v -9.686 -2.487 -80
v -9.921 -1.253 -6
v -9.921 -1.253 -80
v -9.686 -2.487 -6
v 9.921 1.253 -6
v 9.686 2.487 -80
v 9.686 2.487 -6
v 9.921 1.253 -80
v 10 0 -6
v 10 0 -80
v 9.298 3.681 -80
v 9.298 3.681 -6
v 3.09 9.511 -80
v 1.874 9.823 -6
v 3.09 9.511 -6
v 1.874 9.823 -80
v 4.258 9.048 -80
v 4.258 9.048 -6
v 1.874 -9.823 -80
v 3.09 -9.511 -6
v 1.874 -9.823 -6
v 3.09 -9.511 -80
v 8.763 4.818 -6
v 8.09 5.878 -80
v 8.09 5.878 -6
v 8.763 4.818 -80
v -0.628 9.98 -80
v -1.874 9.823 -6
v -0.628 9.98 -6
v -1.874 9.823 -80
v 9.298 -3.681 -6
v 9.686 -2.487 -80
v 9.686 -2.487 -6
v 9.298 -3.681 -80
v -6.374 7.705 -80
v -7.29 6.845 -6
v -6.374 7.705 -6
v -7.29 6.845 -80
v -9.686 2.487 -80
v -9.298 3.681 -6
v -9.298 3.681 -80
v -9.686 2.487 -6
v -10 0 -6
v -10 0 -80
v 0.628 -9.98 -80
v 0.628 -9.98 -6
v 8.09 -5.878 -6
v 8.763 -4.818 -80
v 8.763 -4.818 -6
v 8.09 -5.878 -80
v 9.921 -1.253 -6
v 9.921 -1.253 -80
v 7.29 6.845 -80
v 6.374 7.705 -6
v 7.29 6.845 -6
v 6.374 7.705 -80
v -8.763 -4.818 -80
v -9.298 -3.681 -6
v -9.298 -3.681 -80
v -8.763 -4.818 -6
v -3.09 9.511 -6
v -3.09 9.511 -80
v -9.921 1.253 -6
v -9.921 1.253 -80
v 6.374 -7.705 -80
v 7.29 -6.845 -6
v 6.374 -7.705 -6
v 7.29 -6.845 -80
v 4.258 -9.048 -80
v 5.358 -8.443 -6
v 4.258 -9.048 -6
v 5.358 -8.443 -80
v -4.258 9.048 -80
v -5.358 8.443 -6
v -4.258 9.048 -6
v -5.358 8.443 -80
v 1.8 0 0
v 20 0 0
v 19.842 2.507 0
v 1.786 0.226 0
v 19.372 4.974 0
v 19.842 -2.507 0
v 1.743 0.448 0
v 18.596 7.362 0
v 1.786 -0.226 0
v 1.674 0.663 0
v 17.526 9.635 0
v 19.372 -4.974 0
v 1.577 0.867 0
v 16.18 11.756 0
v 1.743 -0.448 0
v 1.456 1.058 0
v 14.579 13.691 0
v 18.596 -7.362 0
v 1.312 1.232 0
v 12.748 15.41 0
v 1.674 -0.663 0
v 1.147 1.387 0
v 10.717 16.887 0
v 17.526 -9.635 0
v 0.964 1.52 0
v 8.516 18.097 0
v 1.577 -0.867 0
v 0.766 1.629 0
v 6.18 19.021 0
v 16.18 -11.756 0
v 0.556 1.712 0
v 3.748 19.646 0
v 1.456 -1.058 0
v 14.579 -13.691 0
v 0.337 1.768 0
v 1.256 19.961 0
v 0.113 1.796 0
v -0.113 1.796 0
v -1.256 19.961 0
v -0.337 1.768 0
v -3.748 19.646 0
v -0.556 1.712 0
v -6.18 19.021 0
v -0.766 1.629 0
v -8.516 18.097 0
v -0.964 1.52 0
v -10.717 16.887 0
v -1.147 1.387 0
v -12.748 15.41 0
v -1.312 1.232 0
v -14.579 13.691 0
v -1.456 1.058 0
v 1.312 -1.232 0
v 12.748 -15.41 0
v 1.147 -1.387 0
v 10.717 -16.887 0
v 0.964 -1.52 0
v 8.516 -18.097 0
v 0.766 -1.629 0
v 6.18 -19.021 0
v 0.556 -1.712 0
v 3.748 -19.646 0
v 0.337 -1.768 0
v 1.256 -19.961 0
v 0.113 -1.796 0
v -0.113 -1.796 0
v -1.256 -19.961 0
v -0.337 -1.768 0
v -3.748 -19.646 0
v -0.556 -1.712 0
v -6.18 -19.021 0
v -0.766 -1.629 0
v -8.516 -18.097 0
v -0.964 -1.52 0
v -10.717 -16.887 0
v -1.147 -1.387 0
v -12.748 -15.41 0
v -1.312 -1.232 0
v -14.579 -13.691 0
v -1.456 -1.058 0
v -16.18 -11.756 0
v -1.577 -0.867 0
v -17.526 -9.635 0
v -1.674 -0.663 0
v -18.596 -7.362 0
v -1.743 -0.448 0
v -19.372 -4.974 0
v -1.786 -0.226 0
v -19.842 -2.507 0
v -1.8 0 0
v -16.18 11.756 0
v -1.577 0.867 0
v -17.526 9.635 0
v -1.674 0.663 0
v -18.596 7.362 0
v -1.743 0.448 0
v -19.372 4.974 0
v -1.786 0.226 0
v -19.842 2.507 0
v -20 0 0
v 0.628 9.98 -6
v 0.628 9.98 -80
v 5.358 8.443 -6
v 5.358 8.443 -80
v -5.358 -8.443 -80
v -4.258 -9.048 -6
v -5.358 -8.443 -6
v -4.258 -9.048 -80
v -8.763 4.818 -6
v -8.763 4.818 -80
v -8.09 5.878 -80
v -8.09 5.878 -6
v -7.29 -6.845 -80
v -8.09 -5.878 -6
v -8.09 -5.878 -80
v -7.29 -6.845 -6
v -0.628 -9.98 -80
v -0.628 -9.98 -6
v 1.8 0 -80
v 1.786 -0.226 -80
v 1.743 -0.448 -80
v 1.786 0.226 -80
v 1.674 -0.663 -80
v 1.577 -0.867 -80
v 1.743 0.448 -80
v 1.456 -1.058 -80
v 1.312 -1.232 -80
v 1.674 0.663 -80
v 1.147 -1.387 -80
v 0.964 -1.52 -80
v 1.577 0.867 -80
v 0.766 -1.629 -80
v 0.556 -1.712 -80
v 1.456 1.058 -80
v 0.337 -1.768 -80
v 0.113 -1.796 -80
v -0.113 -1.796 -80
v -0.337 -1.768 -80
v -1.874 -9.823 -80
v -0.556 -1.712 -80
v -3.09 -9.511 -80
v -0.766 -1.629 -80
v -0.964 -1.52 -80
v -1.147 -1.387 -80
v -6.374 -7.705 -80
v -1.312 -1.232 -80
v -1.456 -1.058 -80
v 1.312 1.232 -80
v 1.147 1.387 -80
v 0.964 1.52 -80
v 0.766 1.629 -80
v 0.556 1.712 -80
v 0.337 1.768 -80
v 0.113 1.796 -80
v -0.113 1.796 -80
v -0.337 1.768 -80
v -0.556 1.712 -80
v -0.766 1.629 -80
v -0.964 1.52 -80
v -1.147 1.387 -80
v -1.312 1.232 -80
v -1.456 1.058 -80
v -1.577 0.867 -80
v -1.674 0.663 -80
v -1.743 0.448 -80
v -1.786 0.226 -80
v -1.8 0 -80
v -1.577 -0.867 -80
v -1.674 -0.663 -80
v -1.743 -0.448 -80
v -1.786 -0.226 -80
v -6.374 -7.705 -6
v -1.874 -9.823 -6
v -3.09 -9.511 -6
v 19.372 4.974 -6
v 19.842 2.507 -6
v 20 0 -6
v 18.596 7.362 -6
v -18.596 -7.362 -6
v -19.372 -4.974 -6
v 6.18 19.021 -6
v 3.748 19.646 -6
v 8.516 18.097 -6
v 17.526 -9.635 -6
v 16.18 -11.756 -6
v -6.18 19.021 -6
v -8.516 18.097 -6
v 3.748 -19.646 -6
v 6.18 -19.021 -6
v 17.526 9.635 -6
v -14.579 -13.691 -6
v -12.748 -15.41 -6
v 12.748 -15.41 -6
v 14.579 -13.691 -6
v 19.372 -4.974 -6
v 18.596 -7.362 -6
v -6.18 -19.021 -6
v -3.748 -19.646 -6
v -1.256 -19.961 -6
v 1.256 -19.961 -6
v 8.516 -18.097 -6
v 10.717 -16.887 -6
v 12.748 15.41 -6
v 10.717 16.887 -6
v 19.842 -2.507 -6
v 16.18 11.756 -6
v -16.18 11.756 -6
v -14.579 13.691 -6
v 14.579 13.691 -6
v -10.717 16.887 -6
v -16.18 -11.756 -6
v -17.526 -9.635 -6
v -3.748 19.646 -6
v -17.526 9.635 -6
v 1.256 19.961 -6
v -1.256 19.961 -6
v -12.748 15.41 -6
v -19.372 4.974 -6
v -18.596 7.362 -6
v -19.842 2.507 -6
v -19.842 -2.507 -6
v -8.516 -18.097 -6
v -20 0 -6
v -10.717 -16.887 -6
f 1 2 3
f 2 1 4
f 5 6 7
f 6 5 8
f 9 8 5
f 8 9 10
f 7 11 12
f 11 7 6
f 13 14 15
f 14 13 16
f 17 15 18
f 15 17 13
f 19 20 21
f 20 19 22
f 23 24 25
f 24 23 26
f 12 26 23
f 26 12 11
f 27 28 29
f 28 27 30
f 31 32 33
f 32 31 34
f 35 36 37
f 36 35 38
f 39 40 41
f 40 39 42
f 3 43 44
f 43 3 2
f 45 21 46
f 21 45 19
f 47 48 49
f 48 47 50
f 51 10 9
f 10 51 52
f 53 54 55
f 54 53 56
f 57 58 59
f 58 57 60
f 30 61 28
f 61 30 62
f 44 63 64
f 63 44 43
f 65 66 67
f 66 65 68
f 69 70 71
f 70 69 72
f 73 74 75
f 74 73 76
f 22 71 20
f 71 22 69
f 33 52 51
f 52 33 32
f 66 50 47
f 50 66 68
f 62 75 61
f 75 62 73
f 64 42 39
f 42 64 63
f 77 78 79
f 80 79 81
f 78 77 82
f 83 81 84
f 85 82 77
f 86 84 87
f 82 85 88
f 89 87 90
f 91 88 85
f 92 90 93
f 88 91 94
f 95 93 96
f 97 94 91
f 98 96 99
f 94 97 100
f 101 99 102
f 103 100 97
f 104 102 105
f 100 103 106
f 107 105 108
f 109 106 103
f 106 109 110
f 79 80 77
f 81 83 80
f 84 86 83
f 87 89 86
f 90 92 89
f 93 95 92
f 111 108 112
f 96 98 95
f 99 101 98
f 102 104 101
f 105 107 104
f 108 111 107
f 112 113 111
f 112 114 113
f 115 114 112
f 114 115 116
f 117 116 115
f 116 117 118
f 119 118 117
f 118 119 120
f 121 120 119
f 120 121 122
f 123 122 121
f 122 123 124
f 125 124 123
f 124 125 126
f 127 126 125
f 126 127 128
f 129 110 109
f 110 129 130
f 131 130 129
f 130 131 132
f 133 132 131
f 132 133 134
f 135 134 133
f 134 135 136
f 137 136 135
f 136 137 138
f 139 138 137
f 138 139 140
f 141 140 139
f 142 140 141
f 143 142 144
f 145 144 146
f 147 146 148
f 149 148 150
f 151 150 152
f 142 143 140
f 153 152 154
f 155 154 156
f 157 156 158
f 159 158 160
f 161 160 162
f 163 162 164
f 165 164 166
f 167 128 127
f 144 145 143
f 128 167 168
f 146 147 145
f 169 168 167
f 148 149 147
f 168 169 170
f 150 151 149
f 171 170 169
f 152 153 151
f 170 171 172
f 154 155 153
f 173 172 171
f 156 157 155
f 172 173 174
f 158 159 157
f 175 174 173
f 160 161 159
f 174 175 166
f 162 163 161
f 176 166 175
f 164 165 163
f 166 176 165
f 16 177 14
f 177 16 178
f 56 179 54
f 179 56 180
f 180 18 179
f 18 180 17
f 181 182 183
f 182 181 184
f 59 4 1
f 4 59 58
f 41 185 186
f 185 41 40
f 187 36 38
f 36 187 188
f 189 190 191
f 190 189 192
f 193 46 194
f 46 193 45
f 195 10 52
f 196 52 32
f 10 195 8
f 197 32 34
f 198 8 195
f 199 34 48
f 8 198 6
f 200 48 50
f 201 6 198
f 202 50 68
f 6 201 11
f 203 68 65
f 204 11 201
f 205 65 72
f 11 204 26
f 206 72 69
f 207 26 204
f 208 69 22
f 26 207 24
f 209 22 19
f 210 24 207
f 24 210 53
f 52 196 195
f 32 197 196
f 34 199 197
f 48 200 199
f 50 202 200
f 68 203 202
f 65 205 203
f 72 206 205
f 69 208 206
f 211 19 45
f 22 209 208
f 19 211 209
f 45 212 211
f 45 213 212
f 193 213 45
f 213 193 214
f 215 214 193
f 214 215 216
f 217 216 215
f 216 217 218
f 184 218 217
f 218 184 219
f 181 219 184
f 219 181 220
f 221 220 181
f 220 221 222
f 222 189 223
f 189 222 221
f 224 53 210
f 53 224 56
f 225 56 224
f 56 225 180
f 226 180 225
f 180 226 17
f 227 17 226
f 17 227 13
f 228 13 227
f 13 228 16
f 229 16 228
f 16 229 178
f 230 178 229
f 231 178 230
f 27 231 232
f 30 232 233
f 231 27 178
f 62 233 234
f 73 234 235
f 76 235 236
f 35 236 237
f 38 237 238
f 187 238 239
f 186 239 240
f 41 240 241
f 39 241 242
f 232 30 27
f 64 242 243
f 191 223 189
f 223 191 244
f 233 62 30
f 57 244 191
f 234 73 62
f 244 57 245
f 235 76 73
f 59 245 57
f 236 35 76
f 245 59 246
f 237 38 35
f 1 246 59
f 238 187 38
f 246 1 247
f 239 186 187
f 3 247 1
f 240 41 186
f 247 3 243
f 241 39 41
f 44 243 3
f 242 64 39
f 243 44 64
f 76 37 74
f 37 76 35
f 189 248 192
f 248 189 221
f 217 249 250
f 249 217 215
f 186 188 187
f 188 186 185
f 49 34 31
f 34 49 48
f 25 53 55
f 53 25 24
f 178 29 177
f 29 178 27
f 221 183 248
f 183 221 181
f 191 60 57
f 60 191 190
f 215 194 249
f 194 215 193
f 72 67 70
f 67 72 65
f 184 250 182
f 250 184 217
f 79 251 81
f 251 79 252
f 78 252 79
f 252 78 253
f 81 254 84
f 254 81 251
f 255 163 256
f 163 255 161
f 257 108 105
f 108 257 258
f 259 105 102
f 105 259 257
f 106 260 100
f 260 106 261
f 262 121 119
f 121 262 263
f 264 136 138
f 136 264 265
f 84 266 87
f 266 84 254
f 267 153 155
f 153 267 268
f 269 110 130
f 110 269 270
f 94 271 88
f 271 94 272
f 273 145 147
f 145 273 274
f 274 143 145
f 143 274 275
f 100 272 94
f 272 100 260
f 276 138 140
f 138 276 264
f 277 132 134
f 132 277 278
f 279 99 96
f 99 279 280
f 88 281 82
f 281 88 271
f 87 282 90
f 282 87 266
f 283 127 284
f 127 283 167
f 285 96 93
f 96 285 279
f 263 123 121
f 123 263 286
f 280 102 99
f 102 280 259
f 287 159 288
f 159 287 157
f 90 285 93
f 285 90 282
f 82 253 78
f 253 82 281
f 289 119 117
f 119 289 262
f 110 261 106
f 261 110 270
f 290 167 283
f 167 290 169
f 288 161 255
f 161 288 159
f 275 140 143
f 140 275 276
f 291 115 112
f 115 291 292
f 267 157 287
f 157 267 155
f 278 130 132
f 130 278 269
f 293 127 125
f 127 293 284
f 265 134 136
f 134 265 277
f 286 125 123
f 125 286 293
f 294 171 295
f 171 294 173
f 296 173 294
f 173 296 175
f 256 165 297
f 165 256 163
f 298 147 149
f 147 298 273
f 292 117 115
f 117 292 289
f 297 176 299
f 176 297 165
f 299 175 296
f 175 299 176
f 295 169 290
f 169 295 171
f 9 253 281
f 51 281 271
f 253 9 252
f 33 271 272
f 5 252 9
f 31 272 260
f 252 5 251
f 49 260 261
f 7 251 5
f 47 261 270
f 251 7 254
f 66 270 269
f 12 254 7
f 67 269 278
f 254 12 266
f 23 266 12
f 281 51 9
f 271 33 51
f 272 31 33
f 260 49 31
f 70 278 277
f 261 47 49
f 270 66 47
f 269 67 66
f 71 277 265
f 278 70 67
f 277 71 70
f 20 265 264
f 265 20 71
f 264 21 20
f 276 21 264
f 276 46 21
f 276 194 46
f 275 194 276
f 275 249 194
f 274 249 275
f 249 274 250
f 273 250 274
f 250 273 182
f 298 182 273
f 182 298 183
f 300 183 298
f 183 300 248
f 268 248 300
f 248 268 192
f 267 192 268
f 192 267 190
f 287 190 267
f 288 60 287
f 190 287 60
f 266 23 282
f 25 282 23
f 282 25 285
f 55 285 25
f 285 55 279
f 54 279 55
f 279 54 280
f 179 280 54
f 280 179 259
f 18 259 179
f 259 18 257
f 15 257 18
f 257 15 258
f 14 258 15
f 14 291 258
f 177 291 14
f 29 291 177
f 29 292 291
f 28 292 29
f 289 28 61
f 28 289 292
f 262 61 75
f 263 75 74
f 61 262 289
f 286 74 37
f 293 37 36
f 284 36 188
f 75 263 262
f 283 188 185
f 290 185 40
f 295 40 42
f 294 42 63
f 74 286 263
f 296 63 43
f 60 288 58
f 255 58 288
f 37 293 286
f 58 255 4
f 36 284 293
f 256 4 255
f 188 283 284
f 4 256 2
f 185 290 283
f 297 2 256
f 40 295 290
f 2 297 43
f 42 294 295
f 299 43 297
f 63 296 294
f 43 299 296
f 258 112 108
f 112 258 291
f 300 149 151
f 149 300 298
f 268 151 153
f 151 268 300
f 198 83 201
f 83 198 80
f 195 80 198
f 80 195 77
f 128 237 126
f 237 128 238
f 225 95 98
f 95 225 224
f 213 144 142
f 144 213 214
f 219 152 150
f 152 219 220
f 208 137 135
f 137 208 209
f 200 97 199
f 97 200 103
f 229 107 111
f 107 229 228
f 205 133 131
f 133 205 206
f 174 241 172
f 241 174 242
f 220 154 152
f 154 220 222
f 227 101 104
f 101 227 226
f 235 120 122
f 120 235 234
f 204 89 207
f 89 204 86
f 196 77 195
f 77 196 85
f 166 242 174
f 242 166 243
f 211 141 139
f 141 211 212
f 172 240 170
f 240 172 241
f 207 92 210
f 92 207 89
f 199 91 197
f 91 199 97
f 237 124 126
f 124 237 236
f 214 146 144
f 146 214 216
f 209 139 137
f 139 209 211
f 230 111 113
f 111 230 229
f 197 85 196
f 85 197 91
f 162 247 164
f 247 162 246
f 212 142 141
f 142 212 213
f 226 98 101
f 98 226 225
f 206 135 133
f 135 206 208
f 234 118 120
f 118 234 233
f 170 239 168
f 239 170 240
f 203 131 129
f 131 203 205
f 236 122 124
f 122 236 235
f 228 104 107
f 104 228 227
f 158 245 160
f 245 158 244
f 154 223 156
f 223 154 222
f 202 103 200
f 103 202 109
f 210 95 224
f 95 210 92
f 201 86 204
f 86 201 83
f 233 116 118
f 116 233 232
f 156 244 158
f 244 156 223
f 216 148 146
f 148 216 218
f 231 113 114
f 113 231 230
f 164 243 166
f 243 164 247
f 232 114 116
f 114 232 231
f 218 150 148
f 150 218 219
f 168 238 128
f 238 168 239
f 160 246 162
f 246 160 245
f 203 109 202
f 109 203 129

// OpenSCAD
$fn = 50;


difference() {
	union() {
		translate(v = [0, 0, -80.0000000000]) {
			cylinder(h = 80, r = 10.0000000000);
		}
		translate(v = [0, 0, -6.0000000000]) {
			cylinder(h = 6, r = 20.0000000000);
		}
	}
	union() {
		#translate(v = [0, 0, -80]) {
			cylinder(h = 80, r = 1.8000000000);
		}
	}
}
